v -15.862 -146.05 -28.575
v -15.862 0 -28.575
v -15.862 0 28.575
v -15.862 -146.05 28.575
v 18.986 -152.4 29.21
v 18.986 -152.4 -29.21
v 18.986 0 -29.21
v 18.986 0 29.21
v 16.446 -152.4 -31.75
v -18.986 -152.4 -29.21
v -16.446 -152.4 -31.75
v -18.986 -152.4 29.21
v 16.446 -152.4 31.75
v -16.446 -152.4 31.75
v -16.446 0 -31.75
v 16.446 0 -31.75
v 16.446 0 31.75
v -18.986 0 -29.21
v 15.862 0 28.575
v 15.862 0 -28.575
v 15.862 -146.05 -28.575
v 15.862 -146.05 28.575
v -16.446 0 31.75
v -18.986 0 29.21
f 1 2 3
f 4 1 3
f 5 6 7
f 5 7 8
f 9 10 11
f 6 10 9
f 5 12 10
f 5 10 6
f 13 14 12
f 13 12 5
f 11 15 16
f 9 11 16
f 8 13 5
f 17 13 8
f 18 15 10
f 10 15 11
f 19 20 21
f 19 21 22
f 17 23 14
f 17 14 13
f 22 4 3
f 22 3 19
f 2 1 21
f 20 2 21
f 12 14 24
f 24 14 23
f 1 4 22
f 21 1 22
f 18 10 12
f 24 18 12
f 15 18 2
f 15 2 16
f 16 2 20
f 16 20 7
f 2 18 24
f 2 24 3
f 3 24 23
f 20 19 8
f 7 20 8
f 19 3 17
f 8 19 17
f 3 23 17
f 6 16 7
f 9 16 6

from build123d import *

# Parameters (mm, degrees)
F0_W     = 37.973
F0_H     = 63.5
F0_W_2   = 31.7246
F0_H_2   = 57.15
F1_DEPTH = 152.4
F2_W     = 37.973
F2_H     = 63.5
F3_DEPTH = 6.35
F5_SIZE  = 2.54


with BuildPart() as f1:
    # F0 (on Front) → F1 (new body)
    with BuildSketch(Plane.XZ):
        Rectangle(F0_W, F0_H)
        Rectangle(F0_W_2, F0_H_2, mode=Mode.SUBTRACT)
    extrude(amount=F1_DEPTH)

    # F2 (on face) → F3 (join)
    with BuildSketch(Plane.XZ.offset(152.4)):
        Rectangle(F2_W, F2_H)
    extrude(amount=-F3_DEPTH)

    # F5
    f5_edges = [f1.edges().sort_by_distance(p)[0] for p in [
        (18.9865, -76.2, 31.75),
        (-18.9865, -76.2, 31.75),
        (18.9865, -76.2, -31.75),
        (-18.9865, -76.2, -31.75),
    ]]
    chamfer(f5_edges, length=F5_SIZE)


solid = f1.part
